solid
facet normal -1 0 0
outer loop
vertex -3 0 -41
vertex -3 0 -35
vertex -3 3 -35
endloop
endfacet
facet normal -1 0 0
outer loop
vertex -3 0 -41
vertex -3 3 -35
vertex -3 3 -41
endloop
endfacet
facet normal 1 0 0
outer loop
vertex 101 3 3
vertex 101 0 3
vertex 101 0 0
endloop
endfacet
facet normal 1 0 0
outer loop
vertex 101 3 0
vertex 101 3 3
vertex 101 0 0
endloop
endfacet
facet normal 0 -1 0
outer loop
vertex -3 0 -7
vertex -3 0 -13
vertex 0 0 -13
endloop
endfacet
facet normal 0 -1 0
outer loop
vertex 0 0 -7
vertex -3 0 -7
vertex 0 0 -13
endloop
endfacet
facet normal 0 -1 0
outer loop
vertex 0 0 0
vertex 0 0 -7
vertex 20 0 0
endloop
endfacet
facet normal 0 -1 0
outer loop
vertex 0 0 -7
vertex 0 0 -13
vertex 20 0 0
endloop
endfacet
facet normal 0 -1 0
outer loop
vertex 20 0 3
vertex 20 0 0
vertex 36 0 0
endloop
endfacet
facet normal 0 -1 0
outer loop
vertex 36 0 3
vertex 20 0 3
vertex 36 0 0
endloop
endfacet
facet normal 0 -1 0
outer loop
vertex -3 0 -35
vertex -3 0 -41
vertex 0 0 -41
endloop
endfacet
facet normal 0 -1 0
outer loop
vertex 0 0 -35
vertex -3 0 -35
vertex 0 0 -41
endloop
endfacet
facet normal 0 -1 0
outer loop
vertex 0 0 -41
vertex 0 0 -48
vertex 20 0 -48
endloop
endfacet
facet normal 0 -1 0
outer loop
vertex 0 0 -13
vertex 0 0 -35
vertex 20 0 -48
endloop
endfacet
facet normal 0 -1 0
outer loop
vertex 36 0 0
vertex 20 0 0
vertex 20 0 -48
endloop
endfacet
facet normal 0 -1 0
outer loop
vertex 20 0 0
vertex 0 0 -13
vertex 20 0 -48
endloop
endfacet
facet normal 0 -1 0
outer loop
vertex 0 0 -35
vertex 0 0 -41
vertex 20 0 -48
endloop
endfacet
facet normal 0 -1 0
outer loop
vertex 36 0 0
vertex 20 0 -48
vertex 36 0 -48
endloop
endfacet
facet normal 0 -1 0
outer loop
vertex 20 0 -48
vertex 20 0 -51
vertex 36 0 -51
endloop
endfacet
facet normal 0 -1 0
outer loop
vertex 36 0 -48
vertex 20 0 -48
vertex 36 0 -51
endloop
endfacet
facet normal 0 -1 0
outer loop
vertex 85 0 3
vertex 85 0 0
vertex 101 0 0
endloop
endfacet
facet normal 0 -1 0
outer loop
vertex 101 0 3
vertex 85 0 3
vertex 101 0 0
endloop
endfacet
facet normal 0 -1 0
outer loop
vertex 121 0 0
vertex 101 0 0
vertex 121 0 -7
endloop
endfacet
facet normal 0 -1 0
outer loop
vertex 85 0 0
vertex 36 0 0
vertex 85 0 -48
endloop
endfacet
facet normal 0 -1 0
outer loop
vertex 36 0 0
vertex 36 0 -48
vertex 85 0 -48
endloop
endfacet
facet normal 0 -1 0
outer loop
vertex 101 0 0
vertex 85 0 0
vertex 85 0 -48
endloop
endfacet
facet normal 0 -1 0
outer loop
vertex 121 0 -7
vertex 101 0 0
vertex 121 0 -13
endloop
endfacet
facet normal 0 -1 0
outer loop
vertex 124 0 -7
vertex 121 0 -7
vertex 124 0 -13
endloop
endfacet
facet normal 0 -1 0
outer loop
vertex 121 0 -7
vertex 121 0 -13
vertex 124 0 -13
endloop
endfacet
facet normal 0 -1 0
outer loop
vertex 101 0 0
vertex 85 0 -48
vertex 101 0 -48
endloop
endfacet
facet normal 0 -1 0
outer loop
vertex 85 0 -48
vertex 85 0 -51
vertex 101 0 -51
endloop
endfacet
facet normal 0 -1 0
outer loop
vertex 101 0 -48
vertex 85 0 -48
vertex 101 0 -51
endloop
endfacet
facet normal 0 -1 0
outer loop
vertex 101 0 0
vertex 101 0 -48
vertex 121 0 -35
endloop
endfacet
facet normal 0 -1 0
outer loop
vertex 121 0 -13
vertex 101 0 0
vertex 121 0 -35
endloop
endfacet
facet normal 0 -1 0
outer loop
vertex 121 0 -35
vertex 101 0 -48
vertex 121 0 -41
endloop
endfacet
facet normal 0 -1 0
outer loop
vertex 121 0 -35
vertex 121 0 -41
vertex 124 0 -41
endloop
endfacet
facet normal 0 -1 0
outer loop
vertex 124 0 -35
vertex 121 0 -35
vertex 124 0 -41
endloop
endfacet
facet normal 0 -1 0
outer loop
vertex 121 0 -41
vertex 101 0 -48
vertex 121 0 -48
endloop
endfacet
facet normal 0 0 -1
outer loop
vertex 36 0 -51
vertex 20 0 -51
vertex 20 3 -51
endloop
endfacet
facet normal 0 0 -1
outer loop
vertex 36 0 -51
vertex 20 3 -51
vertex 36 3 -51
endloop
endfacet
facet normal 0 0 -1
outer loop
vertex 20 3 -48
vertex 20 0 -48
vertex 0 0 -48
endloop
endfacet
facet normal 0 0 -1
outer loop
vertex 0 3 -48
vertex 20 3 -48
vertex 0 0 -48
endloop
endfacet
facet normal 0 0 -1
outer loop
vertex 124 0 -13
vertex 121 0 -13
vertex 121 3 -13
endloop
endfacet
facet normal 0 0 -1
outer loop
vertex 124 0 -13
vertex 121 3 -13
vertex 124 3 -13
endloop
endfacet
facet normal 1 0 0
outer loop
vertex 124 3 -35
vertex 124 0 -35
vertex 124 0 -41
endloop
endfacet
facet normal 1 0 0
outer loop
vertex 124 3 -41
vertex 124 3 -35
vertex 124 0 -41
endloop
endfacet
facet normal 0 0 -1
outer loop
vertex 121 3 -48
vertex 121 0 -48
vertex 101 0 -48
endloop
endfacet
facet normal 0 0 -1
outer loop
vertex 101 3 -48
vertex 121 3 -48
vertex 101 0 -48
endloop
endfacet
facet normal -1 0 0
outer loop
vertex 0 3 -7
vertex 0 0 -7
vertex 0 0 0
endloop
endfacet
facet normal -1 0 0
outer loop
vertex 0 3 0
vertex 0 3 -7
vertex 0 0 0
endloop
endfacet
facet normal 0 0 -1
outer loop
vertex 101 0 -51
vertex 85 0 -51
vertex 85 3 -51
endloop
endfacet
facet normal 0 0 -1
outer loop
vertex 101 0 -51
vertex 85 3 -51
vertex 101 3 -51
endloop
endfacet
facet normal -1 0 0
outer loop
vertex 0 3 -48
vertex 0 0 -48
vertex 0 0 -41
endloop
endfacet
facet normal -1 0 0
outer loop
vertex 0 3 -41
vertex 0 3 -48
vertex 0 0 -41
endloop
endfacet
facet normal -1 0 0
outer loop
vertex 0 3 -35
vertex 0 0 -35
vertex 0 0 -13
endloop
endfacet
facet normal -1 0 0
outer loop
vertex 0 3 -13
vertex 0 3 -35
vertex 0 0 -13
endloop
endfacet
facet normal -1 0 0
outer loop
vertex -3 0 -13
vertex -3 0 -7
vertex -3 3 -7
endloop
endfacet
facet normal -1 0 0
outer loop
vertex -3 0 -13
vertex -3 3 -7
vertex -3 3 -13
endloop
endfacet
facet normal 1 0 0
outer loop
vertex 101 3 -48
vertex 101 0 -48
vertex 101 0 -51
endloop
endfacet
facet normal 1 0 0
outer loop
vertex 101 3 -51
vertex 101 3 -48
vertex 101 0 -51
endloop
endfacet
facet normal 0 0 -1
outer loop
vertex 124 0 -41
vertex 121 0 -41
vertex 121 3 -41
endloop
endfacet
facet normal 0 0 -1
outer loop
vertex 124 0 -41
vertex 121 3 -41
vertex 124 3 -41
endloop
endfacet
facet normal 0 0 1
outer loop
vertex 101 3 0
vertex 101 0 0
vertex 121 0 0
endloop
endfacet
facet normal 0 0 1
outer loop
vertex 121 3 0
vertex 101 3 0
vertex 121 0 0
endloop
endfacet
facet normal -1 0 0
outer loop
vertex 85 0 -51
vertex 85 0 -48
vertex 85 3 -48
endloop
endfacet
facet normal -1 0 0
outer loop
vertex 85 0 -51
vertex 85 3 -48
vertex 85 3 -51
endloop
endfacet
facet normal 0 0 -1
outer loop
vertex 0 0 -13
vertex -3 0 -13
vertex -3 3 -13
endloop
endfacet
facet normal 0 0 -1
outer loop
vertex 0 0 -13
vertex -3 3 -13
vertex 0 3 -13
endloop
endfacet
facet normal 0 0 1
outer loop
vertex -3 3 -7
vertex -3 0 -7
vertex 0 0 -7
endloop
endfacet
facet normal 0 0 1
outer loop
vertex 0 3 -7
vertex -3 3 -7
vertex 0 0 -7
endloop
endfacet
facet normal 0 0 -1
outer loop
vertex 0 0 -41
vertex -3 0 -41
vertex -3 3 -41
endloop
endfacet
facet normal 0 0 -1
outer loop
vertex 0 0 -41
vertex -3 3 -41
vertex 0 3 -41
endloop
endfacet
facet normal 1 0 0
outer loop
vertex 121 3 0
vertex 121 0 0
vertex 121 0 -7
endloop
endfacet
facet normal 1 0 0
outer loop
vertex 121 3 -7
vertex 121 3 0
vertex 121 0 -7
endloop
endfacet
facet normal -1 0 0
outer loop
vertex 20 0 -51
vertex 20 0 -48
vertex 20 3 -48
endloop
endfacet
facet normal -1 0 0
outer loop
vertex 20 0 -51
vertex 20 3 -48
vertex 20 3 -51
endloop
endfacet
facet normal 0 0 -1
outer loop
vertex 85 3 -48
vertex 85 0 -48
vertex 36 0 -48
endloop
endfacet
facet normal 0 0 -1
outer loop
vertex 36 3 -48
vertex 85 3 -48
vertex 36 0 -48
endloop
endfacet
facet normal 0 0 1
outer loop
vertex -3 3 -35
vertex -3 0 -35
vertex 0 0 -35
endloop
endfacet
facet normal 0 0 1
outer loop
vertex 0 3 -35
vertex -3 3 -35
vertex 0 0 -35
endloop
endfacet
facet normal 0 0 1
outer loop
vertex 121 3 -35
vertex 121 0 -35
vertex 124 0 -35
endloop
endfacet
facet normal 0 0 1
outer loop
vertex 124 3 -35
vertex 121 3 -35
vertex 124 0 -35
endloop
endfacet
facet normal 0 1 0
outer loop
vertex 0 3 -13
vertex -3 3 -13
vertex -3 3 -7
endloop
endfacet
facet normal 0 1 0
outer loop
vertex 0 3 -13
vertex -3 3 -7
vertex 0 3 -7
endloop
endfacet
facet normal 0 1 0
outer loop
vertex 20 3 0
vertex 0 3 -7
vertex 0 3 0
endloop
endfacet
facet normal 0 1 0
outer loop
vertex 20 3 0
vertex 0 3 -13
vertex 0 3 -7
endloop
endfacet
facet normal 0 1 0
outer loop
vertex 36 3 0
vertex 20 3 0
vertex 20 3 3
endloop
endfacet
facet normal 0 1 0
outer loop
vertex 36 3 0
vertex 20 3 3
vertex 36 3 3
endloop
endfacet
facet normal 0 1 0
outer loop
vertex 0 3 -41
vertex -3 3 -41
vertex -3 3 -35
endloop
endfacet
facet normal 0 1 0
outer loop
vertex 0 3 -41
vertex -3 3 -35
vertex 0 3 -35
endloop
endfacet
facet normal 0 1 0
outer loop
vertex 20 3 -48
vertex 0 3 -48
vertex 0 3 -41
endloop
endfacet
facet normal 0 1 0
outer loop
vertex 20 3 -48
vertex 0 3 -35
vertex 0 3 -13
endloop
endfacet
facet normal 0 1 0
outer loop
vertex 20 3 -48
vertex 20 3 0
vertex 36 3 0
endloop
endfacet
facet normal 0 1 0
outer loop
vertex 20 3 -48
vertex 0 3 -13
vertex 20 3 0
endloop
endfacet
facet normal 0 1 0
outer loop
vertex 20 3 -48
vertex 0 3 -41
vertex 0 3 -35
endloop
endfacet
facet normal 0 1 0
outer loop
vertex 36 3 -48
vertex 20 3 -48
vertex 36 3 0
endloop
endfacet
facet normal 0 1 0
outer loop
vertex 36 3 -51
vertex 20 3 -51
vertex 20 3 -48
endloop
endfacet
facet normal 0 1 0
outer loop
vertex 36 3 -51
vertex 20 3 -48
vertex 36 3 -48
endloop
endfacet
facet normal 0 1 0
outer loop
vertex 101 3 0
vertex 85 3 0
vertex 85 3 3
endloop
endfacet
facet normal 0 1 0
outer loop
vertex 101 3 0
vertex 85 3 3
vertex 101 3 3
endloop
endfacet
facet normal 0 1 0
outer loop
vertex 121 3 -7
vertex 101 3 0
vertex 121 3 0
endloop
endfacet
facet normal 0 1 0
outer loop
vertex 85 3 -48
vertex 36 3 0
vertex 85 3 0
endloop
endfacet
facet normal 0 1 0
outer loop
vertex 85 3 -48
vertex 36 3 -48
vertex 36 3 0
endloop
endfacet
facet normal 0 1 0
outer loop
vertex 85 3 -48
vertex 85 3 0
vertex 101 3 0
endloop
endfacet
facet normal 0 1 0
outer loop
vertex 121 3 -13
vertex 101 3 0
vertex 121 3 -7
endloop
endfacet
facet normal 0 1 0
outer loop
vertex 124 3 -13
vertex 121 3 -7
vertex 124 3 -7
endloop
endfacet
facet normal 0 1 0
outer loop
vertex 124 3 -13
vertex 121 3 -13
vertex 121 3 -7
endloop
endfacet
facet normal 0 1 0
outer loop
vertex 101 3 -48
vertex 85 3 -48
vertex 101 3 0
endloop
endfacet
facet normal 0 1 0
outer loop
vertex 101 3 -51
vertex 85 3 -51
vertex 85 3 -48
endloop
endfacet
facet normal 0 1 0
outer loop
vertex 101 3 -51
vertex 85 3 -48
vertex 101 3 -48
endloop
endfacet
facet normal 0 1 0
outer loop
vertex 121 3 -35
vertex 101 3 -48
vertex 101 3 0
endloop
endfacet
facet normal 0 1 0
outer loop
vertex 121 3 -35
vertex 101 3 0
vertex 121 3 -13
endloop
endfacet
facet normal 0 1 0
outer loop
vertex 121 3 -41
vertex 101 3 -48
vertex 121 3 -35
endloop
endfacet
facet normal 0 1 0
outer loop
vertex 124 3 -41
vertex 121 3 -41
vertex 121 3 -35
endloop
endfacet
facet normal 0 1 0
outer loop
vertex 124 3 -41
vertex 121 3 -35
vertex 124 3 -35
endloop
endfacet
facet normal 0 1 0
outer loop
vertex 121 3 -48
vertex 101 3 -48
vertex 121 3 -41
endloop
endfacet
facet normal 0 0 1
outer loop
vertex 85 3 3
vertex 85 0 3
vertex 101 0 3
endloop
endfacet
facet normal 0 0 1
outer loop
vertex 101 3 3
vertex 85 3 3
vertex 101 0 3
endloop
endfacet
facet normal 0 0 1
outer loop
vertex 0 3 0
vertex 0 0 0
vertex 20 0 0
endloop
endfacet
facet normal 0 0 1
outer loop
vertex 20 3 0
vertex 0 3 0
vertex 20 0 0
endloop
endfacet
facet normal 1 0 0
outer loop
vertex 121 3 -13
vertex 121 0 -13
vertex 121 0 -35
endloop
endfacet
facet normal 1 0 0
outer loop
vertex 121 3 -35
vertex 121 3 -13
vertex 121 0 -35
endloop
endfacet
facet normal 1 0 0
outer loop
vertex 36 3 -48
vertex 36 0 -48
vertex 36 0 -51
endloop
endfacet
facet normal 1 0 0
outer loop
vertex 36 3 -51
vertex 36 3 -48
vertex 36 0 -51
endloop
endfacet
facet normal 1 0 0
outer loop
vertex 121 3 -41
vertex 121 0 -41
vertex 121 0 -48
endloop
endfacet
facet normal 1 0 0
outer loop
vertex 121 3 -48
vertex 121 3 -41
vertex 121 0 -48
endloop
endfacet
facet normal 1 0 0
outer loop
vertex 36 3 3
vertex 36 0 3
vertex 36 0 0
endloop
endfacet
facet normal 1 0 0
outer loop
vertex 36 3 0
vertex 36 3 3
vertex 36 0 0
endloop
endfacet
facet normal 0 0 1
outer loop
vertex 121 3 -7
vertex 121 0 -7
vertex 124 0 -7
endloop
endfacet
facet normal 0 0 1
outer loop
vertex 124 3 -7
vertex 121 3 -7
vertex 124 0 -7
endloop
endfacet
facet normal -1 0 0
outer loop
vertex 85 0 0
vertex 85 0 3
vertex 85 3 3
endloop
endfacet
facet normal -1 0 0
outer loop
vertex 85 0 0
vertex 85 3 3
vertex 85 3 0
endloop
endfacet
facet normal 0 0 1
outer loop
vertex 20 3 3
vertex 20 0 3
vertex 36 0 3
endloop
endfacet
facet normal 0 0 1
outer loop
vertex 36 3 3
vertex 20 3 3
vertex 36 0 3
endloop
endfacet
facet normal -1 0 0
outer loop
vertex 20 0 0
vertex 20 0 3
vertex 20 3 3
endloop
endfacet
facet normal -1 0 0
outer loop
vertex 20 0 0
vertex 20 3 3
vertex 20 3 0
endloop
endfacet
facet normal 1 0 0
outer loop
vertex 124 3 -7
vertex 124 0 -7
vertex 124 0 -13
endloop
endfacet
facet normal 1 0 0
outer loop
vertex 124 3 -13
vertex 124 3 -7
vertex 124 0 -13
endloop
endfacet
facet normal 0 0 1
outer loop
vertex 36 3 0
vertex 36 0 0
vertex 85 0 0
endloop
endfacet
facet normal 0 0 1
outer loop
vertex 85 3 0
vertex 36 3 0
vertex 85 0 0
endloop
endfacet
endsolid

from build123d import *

# Parameters (mm, degrees)
SKETCH1_W           = 3
SKETCH1_H           = 6
SKETCH1_W_2         = 16
SKETCH1_H_2         = 3
BOSS_EXTRUDE1_DEPTH = 3


with BuildPart() as part:
    # Sketch1 → Boss-Extrude1 (new body)
    with BuildSketch(Plane(origin=(0, 0, 0), x_dir=(1, 0, 0), z_dir=(0, 1, 0))):
        Polygon((60.5, 0), (60.5, 48), (36, 48), (20, 48), (0, 48), (0, 41), (0, 35), (0, 13), (0, 7), (0, 0), (20, 0), (36, 0), align=None)
        Polygon((85, 48), (60.5, 48), (60.5, 0), (85, 0), (101, 0), (121, 0), (121, 7), (121, 13), (121, 35), (121, 41), (121, 48), (101, 48), align=None)
        with Locations((-1.5, 10)):
            Rectangle(SKETCH1_W, SKETCH1_H)
        with Locations((28, -1.5)):
            Rectangle(SKETCH1_W_2, SKETCH1_H_2)
        with Locations((93, -1.5)):
            Rectangle(SKETCH1_W_2, SKETCH1_H_2)
        with Locations((122.5, 38)):
            Rectangle(SKETCH1_W, SKETCH1_H)
        with Locations((122.5, 10)):
            Rectangle(SKETCH1_W, SKETCH1_H)
        with Locations((-1.5, 38)):
            Rectangle(SKETCH1_W, SKETCH1_H)
        with Locations((28, 49.5)):
            Rectangle(SKETCH1_W_2, SKETCH1_H_2)
        with Locations((93, 49.5)):
            Rectangle(SKETCH1_W_2, SKETCH1_H_2)
    extrude(amount=BOSS_EXTRUDE1_DEPTH)


solid = part.part
